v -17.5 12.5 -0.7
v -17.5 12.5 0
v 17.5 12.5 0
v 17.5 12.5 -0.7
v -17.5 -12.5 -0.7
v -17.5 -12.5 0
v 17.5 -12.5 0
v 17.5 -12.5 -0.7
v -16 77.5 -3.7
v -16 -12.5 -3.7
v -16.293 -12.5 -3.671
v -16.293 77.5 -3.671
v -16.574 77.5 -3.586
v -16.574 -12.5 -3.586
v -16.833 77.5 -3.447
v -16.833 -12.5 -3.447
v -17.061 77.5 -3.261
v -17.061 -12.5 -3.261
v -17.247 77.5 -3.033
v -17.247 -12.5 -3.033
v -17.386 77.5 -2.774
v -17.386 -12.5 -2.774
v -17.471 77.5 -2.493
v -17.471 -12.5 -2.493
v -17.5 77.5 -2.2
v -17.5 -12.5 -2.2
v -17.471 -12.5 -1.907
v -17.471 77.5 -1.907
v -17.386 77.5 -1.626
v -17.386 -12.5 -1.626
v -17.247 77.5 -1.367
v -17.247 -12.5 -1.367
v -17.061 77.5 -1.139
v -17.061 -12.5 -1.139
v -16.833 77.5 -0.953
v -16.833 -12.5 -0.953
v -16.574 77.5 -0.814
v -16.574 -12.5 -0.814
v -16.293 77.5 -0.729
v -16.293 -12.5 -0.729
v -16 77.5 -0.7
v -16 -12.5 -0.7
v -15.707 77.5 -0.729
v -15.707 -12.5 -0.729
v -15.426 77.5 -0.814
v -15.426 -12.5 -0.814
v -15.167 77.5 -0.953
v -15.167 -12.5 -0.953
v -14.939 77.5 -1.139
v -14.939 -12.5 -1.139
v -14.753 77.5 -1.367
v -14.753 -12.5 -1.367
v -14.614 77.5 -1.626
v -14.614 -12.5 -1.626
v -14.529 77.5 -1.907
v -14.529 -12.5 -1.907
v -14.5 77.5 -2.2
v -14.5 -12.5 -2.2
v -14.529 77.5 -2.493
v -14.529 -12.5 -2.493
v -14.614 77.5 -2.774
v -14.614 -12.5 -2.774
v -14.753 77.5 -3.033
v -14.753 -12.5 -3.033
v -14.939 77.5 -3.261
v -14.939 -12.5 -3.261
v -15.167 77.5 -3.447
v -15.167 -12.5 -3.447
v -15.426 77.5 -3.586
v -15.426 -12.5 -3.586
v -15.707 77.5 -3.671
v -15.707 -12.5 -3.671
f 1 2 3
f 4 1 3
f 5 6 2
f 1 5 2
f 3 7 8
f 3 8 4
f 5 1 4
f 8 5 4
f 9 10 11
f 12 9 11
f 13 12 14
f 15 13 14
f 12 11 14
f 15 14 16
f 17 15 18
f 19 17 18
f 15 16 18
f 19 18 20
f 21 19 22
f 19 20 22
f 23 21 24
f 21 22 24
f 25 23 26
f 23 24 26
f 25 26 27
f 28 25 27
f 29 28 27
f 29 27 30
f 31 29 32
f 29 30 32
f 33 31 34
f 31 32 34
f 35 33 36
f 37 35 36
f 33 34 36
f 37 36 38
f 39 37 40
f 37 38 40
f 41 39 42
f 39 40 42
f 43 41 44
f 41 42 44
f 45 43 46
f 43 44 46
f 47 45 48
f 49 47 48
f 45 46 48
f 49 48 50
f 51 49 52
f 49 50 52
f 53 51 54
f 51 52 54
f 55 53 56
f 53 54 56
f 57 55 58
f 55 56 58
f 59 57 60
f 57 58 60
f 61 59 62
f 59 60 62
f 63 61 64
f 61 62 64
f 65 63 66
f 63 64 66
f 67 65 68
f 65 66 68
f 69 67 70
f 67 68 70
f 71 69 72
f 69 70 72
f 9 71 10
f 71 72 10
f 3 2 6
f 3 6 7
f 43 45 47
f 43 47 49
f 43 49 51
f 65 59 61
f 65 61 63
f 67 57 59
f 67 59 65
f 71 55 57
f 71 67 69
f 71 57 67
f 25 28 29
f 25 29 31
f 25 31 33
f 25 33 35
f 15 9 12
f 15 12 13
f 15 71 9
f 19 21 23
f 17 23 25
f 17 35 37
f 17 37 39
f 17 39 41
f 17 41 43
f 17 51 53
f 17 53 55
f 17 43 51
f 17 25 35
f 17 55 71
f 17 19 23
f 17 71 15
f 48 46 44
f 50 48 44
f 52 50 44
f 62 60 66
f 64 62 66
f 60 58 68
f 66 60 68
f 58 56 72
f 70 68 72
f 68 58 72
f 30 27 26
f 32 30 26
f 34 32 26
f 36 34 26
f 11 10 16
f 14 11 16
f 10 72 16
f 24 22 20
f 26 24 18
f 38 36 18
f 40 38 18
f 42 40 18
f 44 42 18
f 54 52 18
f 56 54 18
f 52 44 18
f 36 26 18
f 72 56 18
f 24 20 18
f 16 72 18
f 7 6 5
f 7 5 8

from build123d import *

# Parameters (mm, degrees)
SKETCH1_W           = 35
SKETCH1_H           = 25
BASE_FLANGE1_DEPTH  = 0.7
SKETCH6_R           = 1.5
BOSS_EXTRUDE1_DEPTH = 90


# Sheet-metal steps are written as plain solids
with BuildPart() as part:
    # Sketch1 → Base-Flange1 (new body)
    with BuildSketch(Plane.XY):
        Rectangle(SKETCH1_W, SKETCH1_H)
    extrude(amount=-BASE_FLANGE1_DEPTH)


with BuildPart() as body_2:
    # Sketch6 → Boss-Extrude1 (new body)
    with BuildSketch(Plane(origin=(0, -12.5, 0), x_dir=(1, 0, 0), z_dir=(0, 1, 0))):
        with Locations(Location((-16, 2.2, 0), (0, 0, 90))):
            Circle(SKETCH6_R)
    extrude(amount=BOSS_EXTRUDE1_DEPTH)


solid = Compound([part.part, body_2.part])
